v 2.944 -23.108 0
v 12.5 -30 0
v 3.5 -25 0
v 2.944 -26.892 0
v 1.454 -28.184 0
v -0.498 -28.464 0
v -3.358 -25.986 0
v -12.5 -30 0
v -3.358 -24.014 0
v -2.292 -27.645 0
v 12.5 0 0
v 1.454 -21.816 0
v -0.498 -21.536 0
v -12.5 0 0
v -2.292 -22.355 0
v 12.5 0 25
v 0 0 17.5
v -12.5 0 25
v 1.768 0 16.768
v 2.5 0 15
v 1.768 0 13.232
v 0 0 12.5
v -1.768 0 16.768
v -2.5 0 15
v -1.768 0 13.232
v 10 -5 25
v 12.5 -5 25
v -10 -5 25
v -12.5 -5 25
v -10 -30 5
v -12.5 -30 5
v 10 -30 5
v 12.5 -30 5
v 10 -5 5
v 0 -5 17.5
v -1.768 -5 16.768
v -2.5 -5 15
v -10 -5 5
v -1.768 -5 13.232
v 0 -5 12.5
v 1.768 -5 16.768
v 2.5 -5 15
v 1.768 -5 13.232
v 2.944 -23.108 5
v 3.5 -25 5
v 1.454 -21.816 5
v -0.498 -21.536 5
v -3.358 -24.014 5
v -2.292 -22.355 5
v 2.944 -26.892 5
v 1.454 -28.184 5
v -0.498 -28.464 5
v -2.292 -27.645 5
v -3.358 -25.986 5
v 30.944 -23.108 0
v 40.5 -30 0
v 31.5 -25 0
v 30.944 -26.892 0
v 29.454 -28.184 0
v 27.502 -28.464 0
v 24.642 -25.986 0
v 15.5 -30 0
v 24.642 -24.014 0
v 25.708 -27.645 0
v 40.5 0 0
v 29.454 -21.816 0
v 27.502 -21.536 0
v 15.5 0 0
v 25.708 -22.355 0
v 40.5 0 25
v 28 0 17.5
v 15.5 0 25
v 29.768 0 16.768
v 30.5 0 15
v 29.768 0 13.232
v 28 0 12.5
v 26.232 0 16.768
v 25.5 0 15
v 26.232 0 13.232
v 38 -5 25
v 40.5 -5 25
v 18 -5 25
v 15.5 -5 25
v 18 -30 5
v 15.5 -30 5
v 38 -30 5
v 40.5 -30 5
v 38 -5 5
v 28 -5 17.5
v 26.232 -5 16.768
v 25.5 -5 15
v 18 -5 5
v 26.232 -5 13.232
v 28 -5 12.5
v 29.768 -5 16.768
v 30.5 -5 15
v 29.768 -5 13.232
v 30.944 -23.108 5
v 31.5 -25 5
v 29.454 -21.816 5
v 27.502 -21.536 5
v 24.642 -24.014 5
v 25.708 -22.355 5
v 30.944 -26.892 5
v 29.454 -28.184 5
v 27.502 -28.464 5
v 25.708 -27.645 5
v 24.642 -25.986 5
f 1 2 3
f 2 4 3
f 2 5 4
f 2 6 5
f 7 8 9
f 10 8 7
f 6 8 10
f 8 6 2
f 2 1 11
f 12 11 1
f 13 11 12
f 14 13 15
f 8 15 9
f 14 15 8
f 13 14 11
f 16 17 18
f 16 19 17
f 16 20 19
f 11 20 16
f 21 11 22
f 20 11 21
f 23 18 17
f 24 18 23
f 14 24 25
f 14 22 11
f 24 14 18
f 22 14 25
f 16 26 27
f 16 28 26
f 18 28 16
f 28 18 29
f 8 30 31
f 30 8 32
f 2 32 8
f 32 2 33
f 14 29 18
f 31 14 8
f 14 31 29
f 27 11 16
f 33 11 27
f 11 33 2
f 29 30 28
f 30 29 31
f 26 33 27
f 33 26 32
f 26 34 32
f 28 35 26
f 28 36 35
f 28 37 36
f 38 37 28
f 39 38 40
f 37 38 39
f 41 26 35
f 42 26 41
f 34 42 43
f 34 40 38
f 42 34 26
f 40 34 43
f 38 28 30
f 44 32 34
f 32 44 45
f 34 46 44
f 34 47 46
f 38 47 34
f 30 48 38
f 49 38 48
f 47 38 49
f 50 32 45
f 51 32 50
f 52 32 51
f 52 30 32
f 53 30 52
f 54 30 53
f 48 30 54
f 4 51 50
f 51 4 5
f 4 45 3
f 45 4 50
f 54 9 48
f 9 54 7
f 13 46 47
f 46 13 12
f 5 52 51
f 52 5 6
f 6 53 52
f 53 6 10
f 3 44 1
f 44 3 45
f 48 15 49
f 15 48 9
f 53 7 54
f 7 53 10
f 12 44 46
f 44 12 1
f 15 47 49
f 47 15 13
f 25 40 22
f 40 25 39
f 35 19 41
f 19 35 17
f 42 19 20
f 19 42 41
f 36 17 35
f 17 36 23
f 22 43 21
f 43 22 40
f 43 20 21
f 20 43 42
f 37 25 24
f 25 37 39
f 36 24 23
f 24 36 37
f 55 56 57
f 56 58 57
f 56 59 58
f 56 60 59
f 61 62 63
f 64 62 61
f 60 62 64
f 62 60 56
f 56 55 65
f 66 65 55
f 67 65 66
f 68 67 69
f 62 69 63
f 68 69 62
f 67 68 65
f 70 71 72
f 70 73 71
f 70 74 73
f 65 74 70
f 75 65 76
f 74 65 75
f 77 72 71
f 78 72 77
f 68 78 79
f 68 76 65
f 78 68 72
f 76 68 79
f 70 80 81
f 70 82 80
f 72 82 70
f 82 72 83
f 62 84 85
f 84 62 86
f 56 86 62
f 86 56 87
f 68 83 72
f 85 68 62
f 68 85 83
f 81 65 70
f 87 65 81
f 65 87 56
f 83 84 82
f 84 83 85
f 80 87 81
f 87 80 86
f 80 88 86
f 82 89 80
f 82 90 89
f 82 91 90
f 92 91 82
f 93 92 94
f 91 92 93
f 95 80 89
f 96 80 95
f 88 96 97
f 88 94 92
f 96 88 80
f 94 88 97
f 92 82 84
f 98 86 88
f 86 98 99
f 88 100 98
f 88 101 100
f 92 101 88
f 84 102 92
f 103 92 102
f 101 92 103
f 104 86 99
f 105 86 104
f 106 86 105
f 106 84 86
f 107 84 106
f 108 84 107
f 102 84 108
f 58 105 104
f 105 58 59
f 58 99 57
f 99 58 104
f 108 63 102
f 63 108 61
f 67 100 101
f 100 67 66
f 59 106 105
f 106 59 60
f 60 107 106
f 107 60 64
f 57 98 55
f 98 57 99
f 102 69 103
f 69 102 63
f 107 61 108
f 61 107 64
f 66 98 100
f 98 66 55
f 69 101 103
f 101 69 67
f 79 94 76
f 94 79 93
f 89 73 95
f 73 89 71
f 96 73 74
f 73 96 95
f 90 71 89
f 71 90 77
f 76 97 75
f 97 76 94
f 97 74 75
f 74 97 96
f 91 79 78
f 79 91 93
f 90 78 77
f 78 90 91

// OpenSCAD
module bracket()
{
render() difference()
{
translate([25/2,0,0]) rotate([0,-90,0]) linear_extrude(height=25) polygon([[0,0], [0,25], [5,25], [30,5], [30,0]]);
translate([-10,5,5]) cube([20,25,25]);
translate([0,10,25]) rotate([90,0,0]) cylinder(r=6/2+0.5, h=20);
translate([0,15,-5]) cylinder(r=5/2, h=20);
}


}

rotate([90,0,0]) bracket();
translate([28,0,0]) rotate([90,0,0]) bracket();
